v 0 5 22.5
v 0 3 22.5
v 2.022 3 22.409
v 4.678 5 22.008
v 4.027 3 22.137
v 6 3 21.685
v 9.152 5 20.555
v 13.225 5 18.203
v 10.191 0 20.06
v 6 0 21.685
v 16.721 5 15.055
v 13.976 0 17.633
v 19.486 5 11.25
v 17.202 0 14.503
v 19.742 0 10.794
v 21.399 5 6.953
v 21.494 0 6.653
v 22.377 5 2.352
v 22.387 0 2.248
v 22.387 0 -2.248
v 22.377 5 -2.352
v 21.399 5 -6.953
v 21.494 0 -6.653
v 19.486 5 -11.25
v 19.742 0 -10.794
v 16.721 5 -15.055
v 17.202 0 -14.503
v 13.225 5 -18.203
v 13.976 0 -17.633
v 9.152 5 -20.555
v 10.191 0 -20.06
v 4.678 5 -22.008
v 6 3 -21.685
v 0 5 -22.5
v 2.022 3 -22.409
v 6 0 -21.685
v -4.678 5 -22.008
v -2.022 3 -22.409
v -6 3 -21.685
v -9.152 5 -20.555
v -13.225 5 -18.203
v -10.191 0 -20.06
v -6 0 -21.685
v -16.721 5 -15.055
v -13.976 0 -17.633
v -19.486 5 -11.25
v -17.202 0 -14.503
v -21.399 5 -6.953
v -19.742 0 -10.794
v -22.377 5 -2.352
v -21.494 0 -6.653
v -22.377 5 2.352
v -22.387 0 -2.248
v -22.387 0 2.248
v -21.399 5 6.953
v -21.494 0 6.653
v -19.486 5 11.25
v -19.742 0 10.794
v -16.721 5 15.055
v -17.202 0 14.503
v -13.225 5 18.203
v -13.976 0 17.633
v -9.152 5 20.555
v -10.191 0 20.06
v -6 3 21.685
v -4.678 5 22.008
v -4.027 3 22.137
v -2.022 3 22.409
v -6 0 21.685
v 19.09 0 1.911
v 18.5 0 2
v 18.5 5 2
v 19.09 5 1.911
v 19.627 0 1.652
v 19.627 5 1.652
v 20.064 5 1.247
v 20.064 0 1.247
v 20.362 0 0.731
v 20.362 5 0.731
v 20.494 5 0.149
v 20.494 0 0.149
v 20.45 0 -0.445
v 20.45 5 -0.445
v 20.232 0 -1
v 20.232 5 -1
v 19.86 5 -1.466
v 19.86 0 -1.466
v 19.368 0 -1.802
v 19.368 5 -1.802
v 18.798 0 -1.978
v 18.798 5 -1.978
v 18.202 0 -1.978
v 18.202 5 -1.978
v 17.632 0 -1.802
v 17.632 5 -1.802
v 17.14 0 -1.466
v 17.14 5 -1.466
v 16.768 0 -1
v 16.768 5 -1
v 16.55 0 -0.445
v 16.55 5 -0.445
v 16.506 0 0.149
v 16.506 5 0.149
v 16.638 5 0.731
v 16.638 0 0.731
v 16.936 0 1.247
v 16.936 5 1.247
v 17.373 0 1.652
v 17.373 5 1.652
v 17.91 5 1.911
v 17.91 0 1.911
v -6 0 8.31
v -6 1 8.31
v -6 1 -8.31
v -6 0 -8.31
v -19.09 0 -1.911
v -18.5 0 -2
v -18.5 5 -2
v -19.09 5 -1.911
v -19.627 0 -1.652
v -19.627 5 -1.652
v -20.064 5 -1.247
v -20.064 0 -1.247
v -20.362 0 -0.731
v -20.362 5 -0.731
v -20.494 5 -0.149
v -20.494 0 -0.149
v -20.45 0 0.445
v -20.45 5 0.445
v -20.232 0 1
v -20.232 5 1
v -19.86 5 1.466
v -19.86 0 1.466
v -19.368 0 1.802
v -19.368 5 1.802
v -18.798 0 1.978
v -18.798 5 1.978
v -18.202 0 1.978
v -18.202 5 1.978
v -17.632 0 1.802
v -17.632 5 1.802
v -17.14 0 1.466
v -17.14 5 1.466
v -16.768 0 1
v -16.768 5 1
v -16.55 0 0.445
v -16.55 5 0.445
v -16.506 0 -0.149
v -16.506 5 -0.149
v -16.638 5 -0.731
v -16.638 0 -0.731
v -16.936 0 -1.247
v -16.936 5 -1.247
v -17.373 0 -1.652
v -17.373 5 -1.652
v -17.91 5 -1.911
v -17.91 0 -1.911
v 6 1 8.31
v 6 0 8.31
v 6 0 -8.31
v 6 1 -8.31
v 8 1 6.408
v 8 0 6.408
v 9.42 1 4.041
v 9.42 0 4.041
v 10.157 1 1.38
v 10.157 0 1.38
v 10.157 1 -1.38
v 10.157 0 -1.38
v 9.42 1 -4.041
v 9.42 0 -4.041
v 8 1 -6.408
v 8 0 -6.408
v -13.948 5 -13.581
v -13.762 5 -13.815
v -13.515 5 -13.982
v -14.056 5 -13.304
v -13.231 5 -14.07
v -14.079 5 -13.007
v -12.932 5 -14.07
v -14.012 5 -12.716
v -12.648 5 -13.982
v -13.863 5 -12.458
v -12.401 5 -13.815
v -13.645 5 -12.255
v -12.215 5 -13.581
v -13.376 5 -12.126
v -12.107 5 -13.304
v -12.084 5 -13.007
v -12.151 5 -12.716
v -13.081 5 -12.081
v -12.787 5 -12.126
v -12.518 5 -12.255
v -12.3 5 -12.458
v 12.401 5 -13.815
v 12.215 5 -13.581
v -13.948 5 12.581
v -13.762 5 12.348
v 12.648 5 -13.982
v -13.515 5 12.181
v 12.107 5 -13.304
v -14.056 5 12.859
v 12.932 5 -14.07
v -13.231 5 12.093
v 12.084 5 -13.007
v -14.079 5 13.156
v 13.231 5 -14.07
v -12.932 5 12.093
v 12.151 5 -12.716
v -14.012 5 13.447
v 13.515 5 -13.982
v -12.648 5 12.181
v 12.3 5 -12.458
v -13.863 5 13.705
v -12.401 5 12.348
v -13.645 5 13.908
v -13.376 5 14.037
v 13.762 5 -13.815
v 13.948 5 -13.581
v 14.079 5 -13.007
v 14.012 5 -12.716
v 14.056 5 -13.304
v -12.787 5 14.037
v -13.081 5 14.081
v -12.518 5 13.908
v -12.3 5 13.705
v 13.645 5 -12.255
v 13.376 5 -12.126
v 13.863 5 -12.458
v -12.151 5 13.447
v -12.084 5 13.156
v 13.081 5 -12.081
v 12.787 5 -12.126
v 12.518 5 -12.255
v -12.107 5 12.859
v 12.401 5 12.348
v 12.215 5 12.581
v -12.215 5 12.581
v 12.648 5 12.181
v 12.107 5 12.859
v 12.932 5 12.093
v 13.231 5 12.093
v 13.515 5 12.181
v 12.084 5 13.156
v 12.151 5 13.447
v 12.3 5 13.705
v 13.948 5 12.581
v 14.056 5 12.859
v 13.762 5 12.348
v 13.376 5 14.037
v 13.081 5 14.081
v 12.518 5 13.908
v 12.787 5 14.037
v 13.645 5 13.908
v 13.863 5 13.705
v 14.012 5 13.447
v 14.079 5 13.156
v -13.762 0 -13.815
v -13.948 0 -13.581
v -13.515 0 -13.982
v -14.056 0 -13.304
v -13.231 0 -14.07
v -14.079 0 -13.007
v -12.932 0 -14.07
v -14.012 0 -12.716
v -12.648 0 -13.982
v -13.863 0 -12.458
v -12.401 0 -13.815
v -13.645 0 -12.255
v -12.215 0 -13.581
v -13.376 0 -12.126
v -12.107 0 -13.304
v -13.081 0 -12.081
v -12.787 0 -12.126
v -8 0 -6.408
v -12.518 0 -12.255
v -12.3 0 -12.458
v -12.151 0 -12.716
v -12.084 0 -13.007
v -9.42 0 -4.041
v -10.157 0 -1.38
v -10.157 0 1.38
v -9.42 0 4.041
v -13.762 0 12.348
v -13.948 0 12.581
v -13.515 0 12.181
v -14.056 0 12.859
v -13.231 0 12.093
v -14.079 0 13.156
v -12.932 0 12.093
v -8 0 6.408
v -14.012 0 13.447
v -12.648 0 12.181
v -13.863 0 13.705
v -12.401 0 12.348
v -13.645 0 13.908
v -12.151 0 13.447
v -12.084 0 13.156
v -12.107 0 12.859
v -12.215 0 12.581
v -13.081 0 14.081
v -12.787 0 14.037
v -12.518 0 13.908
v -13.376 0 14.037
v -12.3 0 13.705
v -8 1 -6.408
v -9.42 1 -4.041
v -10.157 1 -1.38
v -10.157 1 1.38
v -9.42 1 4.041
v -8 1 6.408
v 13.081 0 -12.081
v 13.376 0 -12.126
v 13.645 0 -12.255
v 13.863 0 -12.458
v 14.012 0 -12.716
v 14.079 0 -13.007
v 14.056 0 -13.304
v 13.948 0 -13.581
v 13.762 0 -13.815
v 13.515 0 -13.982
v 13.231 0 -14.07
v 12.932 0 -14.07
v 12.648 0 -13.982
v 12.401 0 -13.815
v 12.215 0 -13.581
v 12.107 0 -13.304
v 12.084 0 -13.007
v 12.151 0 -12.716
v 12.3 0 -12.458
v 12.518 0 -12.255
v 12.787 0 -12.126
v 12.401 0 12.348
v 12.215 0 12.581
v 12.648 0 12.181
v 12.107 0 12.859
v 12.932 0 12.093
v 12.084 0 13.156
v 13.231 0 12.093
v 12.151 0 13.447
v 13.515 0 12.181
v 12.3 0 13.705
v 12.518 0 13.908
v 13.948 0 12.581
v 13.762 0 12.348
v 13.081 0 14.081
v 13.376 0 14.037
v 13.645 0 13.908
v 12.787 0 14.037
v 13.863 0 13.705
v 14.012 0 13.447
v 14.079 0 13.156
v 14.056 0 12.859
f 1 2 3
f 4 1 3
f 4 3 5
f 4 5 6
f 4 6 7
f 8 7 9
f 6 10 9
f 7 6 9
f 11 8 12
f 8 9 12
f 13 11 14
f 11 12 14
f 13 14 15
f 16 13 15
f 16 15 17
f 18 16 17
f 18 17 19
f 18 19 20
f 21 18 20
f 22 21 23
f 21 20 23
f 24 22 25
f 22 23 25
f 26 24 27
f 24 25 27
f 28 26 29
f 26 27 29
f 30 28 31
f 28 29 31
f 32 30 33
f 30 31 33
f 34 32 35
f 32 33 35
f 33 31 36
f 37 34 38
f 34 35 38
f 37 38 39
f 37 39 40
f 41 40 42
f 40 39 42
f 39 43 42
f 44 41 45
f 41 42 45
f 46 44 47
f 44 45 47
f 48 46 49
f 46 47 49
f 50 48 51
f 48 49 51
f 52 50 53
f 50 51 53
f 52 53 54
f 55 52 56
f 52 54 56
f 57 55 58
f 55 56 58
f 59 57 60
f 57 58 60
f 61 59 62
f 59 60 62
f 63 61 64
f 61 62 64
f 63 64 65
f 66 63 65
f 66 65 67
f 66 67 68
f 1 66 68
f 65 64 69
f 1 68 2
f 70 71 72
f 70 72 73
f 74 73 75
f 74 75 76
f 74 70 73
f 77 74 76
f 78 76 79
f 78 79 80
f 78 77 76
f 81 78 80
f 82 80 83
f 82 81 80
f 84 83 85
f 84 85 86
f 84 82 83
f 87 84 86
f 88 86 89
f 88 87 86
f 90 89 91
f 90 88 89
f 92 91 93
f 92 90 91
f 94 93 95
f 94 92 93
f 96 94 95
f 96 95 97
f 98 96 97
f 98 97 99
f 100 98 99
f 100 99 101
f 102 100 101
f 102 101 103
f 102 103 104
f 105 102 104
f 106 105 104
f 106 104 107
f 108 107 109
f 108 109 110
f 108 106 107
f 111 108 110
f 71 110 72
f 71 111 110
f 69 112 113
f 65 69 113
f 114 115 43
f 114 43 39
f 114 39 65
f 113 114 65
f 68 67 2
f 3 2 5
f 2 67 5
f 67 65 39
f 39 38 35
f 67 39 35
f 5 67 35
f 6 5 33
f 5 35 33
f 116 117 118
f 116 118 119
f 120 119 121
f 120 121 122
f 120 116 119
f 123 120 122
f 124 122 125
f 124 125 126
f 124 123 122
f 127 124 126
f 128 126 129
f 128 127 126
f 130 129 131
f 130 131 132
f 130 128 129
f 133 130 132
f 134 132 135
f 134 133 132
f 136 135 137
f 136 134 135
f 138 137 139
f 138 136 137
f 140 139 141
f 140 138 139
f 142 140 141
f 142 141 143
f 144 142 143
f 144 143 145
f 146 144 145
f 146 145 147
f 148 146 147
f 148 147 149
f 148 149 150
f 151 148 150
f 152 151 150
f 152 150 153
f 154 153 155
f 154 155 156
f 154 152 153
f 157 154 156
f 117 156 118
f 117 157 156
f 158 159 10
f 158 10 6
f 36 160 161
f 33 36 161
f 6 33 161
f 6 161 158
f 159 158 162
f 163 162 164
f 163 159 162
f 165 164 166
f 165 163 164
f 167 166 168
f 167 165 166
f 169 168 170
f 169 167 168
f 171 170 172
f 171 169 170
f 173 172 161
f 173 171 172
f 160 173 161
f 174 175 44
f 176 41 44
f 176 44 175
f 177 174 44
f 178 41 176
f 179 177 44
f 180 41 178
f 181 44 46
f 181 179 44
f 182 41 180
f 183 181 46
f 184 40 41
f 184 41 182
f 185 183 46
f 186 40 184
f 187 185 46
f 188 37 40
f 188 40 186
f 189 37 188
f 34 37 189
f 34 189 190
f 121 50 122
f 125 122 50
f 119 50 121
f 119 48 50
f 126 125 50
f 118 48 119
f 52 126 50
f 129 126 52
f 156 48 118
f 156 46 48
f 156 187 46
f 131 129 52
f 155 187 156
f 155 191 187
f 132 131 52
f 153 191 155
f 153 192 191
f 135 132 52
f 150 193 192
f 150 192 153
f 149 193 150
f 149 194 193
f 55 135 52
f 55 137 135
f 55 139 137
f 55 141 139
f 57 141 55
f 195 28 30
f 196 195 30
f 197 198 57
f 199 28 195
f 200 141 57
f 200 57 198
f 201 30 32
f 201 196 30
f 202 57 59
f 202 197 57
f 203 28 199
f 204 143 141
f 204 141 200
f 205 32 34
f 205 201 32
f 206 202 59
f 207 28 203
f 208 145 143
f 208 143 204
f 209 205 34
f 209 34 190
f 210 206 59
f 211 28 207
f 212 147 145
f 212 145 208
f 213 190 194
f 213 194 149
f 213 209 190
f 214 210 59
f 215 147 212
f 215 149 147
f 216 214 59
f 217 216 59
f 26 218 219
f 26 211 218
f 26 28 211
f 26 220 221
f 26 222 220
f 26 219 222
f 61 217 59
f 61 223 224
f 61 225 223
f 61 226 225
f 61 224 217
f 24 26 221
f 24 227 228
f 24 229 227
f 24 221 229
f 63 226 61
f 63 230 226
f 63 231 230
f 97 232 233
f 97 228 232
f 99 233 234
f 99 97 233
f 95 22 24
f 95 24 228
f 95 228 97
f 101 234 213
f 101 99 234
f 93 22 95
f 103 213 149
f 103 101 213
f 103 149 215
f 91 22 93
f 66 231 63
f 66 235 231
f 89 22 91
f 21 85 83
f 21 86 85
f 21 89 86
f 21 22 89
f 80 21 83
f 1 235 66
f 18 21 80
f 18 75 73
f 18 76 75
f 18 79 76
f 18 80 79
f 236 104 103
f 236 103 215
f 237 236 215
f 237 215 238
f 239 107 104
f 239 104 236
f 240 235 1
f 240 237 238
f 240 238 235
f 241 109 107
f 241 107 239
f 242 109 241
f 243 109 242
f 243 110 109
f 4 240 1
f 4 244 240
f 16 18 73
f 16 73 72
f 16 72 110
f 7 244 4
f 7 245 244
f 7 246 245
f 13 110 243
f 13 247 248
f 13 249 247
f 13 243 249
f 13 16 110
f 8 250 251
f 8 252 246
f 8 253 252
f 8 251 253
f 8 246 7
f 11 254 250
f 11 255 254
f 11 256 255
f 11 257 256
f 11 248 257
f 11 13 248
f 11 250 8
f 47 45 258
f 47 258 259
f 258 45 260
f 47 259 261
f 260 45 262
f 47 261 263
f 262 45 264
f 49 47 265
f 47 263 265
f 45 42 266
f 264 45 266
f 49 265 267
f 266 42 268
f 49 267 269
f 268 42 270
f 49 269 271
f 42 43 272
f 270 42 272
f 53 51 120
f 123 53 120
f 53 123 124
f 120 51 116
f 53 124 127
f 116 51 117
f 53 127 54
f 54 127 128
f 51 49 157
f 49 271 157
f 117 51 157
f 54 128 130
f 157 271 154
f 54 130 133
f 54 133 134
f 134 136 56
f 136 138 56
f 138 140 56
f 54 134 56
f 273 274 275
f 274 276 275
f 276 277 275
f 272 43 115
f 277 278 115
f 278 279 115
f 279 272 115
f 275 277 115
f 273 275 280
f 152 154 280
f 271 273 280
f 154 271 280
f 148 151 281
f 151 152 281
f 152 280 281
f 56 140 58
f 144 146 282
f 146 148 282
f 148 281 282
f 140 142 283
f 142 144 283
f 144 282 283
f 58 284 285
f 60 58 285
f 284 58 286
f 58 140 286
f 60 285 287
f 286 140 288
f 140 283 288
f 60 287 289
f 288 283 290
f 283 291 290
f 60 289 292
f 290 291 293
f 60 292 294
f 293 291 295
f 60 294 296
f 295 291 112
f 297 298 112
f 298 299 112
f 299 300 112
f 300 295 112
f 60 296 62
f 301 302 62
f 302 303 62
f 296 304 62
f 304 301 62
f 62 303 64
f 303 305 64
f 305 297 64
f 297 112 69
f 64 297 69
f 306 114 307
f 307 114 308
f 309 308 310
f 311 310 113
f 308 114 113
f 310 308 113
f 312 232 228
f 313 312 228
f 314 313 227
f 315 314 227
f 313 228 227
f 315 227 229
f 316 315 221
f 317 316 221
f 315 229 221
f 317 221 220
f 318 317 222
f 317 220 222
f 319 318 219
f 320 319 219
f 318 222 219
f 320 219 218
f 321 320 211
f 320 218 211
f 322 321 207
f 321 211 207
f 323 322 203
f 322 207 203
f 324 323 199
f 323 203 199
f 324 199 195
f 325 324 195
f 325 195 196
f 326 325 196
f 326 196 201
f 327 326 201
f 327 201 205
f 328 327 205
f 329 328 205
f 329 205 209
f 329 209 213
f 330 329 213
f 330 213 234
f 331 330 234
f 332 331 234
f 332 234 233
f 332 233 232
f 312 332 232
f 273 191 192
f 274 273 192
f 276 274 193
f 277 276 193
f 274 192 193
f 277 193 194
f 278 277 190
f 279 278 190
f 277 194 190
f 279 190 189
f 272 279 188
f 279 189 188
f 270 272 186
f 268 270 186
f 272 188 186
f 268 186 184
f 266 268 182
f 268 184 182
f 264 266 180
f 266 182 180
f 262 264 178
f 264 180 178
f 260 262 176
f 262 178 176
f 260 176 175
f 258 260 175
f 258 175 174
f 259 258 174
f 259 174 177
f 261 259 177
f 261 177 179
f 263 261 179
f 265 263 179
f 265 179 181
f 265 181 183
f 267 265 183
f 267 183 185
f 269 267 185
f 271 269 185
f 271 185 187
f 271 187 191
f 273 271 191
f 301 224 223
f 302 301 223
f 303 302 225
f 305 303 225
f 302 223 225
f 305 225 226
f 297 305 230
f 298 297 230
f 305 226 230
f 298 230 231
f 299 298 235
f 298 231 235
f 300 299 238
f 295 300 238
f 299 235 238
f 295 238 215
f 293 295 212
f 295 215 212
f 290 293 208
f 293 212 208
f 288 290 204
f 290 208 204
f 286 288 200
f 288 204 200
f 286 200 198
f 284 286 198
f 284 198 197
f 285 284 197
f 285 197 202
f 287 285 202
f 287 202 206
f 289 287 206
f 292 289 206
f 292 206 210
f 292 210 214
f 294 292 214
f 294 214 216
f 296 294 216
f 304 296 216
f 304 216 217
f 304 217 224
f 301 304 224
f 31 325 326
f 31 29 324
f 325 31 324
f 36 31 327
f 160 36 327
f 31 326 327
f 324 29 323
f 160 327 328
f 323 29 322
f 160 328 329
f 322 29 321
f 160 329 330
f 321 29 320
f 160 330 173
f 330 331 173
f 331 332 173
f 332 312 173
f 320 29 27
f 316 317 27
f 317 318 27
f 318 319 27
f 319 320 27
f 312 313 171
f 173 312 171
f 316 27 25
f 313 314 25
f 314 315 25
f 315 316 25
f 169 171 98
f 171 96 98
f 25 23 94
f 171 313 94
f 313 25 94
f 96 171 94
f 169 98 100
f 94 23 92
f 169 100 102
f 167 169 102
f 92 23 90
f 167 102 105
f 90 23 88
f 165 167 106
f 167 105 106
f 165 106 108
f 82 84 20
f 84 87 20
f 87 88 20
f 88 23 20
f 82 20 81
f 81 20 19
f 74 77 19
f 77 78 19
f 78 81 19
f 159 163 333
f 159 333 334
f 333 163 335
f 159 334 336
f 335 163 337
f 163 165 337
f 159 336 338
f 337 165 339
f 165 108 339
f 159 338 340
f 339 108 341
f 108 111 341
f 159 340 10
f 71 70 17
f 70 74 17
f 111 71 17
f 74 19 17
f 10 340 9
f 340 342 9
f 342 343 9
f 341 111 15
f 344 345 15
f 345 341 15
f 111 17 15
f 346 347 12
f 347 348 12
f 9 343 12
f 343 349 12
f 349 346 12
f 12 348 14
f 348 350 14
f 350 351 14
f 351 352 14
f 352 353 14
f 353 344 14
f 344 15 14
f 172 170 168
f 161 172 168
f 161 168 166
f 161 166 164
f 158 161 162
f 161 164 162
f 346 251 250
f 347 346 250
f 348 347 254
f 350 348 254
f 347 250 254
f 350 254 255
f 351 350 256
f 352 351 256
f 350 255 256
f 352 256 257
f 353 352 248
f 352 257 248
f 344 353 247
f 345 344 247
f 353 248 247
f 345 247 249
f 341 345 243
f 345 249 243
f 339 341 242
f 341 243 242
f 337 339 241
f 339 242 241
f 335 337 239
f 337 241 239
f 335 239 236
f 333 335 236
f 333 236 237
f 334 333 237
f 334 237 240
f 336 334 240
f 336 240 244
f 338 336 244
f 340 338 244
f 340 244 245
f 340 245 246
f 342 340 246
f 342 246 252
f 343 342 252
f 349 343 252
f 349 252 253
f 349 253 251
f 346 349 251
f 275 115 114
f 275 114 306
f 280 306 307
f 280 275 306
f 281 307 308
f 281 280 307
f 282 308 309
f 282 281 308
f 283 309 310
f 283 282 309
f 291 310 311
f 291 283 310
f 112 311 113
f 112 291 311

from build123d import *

# Parameters (mm, degrees)
SKETCH_1_R               = 22.5
SKETCH_1_R_2             = 2
EXTRUDE_1_DEPTH          = 5
SKETCH_2_R               = 10.25
CUT_EXTRUDE_1_DEPTH      = 1
CUT_EXTRUDE_2_DEPTH      = 33.210246817
CUT_EXTRUDE_2_DEPTH_BACK = 33.210246817
SKETCH_3_W               = 12
SKETCH_3_H               = 3
SKETCH_4_R               = 1
CUT_EXTRUDE_3_DEPTH      = 33.210246817


with BuildPart() as part:
    # 草图1 → 凸台-拉伸1 (new body)
    with BuildSketch(Plane(origin=(0, 0, 0), x_dir=(1, 0, 0), z_dir=(0, 1, 0))):
        with Locations(Location((0, 0, 0), (0, 0, 270))):
            Circle(SKETCH_1_R)
        with Locations(Location((18.5, 0, 0), (0, 0, 270))):
            Circle(SKETCH_1_R_2, mode=Mode.SUBTRACT)
        with Locations(Location((-18.5, 0, 0), (0, 0, 90))):
            Circle(SKETCH_1_R_2, mode=Mode.SUBTRACT)
    extrude(amount=EXTRUDE_1_DEPTH)

    # 草图2 → 切除-拉伸1 (cut)
    with BuildSketch(Plane(origin=(0, 0, 0), x_dir=(1, 0, 0), z_dir=(0, 1, 0))):
        with Locations(Location((0, 0, 0), (0, 0, 270))):
            Circle(SKETCH_2_R)
    extrude(amount=CUT_EXTRUDE_1_DEPTH, mode=Mode.SUBTRACT)

    # 草图3 → 切除-拉伸2 (cut, two sides: drawn at the far end of the back side and taken through both)
    with BuildSketch(Plane.XY.offset(-CUT_EXTRUDE_2_DEPTH_BACK)):
        with Locations((0, 1.5)):
            Rectangle(SKETCH_3_W, SKETCH_3_H)
    extrude(amount=CUT_EXTRUDE_2_DEPTH + CUT_EXTRUDE_2_DEPTH_BACK, mode=Mode.SUBTRACT)

    # 草图4 → 切除-拉伸3 (cut, through all)
    with BuildSketch(Plane(origin=(0, 5, 0), x_dir=(1, 0, 0), z_dir=(0, 1, 0))):
        with Locations(Location((13.081475452, 13.081475452, 0), (0, 0, 270))):
            Circle(SKETCH_4_R)
        with Locations(Location((13.081475452, -13.081475452, 0), (0, 0, 270))):
            Circle(SKETCH_4_R)
        with Locations(Location((-13.081475452, 13.081475452, 0), (0, 0, 270))):
            Circle(SKETCH_4_R)
        with Locations(Location((-13.081475452, -13.081475452, 0), (0, 0, 270))):
            Circle(SKETCH_4_R)
    extrude(amount=-CUT_EXTRUDE_3_DEPTH, mode=Mode.SUBTRACT)


solid = part.part
